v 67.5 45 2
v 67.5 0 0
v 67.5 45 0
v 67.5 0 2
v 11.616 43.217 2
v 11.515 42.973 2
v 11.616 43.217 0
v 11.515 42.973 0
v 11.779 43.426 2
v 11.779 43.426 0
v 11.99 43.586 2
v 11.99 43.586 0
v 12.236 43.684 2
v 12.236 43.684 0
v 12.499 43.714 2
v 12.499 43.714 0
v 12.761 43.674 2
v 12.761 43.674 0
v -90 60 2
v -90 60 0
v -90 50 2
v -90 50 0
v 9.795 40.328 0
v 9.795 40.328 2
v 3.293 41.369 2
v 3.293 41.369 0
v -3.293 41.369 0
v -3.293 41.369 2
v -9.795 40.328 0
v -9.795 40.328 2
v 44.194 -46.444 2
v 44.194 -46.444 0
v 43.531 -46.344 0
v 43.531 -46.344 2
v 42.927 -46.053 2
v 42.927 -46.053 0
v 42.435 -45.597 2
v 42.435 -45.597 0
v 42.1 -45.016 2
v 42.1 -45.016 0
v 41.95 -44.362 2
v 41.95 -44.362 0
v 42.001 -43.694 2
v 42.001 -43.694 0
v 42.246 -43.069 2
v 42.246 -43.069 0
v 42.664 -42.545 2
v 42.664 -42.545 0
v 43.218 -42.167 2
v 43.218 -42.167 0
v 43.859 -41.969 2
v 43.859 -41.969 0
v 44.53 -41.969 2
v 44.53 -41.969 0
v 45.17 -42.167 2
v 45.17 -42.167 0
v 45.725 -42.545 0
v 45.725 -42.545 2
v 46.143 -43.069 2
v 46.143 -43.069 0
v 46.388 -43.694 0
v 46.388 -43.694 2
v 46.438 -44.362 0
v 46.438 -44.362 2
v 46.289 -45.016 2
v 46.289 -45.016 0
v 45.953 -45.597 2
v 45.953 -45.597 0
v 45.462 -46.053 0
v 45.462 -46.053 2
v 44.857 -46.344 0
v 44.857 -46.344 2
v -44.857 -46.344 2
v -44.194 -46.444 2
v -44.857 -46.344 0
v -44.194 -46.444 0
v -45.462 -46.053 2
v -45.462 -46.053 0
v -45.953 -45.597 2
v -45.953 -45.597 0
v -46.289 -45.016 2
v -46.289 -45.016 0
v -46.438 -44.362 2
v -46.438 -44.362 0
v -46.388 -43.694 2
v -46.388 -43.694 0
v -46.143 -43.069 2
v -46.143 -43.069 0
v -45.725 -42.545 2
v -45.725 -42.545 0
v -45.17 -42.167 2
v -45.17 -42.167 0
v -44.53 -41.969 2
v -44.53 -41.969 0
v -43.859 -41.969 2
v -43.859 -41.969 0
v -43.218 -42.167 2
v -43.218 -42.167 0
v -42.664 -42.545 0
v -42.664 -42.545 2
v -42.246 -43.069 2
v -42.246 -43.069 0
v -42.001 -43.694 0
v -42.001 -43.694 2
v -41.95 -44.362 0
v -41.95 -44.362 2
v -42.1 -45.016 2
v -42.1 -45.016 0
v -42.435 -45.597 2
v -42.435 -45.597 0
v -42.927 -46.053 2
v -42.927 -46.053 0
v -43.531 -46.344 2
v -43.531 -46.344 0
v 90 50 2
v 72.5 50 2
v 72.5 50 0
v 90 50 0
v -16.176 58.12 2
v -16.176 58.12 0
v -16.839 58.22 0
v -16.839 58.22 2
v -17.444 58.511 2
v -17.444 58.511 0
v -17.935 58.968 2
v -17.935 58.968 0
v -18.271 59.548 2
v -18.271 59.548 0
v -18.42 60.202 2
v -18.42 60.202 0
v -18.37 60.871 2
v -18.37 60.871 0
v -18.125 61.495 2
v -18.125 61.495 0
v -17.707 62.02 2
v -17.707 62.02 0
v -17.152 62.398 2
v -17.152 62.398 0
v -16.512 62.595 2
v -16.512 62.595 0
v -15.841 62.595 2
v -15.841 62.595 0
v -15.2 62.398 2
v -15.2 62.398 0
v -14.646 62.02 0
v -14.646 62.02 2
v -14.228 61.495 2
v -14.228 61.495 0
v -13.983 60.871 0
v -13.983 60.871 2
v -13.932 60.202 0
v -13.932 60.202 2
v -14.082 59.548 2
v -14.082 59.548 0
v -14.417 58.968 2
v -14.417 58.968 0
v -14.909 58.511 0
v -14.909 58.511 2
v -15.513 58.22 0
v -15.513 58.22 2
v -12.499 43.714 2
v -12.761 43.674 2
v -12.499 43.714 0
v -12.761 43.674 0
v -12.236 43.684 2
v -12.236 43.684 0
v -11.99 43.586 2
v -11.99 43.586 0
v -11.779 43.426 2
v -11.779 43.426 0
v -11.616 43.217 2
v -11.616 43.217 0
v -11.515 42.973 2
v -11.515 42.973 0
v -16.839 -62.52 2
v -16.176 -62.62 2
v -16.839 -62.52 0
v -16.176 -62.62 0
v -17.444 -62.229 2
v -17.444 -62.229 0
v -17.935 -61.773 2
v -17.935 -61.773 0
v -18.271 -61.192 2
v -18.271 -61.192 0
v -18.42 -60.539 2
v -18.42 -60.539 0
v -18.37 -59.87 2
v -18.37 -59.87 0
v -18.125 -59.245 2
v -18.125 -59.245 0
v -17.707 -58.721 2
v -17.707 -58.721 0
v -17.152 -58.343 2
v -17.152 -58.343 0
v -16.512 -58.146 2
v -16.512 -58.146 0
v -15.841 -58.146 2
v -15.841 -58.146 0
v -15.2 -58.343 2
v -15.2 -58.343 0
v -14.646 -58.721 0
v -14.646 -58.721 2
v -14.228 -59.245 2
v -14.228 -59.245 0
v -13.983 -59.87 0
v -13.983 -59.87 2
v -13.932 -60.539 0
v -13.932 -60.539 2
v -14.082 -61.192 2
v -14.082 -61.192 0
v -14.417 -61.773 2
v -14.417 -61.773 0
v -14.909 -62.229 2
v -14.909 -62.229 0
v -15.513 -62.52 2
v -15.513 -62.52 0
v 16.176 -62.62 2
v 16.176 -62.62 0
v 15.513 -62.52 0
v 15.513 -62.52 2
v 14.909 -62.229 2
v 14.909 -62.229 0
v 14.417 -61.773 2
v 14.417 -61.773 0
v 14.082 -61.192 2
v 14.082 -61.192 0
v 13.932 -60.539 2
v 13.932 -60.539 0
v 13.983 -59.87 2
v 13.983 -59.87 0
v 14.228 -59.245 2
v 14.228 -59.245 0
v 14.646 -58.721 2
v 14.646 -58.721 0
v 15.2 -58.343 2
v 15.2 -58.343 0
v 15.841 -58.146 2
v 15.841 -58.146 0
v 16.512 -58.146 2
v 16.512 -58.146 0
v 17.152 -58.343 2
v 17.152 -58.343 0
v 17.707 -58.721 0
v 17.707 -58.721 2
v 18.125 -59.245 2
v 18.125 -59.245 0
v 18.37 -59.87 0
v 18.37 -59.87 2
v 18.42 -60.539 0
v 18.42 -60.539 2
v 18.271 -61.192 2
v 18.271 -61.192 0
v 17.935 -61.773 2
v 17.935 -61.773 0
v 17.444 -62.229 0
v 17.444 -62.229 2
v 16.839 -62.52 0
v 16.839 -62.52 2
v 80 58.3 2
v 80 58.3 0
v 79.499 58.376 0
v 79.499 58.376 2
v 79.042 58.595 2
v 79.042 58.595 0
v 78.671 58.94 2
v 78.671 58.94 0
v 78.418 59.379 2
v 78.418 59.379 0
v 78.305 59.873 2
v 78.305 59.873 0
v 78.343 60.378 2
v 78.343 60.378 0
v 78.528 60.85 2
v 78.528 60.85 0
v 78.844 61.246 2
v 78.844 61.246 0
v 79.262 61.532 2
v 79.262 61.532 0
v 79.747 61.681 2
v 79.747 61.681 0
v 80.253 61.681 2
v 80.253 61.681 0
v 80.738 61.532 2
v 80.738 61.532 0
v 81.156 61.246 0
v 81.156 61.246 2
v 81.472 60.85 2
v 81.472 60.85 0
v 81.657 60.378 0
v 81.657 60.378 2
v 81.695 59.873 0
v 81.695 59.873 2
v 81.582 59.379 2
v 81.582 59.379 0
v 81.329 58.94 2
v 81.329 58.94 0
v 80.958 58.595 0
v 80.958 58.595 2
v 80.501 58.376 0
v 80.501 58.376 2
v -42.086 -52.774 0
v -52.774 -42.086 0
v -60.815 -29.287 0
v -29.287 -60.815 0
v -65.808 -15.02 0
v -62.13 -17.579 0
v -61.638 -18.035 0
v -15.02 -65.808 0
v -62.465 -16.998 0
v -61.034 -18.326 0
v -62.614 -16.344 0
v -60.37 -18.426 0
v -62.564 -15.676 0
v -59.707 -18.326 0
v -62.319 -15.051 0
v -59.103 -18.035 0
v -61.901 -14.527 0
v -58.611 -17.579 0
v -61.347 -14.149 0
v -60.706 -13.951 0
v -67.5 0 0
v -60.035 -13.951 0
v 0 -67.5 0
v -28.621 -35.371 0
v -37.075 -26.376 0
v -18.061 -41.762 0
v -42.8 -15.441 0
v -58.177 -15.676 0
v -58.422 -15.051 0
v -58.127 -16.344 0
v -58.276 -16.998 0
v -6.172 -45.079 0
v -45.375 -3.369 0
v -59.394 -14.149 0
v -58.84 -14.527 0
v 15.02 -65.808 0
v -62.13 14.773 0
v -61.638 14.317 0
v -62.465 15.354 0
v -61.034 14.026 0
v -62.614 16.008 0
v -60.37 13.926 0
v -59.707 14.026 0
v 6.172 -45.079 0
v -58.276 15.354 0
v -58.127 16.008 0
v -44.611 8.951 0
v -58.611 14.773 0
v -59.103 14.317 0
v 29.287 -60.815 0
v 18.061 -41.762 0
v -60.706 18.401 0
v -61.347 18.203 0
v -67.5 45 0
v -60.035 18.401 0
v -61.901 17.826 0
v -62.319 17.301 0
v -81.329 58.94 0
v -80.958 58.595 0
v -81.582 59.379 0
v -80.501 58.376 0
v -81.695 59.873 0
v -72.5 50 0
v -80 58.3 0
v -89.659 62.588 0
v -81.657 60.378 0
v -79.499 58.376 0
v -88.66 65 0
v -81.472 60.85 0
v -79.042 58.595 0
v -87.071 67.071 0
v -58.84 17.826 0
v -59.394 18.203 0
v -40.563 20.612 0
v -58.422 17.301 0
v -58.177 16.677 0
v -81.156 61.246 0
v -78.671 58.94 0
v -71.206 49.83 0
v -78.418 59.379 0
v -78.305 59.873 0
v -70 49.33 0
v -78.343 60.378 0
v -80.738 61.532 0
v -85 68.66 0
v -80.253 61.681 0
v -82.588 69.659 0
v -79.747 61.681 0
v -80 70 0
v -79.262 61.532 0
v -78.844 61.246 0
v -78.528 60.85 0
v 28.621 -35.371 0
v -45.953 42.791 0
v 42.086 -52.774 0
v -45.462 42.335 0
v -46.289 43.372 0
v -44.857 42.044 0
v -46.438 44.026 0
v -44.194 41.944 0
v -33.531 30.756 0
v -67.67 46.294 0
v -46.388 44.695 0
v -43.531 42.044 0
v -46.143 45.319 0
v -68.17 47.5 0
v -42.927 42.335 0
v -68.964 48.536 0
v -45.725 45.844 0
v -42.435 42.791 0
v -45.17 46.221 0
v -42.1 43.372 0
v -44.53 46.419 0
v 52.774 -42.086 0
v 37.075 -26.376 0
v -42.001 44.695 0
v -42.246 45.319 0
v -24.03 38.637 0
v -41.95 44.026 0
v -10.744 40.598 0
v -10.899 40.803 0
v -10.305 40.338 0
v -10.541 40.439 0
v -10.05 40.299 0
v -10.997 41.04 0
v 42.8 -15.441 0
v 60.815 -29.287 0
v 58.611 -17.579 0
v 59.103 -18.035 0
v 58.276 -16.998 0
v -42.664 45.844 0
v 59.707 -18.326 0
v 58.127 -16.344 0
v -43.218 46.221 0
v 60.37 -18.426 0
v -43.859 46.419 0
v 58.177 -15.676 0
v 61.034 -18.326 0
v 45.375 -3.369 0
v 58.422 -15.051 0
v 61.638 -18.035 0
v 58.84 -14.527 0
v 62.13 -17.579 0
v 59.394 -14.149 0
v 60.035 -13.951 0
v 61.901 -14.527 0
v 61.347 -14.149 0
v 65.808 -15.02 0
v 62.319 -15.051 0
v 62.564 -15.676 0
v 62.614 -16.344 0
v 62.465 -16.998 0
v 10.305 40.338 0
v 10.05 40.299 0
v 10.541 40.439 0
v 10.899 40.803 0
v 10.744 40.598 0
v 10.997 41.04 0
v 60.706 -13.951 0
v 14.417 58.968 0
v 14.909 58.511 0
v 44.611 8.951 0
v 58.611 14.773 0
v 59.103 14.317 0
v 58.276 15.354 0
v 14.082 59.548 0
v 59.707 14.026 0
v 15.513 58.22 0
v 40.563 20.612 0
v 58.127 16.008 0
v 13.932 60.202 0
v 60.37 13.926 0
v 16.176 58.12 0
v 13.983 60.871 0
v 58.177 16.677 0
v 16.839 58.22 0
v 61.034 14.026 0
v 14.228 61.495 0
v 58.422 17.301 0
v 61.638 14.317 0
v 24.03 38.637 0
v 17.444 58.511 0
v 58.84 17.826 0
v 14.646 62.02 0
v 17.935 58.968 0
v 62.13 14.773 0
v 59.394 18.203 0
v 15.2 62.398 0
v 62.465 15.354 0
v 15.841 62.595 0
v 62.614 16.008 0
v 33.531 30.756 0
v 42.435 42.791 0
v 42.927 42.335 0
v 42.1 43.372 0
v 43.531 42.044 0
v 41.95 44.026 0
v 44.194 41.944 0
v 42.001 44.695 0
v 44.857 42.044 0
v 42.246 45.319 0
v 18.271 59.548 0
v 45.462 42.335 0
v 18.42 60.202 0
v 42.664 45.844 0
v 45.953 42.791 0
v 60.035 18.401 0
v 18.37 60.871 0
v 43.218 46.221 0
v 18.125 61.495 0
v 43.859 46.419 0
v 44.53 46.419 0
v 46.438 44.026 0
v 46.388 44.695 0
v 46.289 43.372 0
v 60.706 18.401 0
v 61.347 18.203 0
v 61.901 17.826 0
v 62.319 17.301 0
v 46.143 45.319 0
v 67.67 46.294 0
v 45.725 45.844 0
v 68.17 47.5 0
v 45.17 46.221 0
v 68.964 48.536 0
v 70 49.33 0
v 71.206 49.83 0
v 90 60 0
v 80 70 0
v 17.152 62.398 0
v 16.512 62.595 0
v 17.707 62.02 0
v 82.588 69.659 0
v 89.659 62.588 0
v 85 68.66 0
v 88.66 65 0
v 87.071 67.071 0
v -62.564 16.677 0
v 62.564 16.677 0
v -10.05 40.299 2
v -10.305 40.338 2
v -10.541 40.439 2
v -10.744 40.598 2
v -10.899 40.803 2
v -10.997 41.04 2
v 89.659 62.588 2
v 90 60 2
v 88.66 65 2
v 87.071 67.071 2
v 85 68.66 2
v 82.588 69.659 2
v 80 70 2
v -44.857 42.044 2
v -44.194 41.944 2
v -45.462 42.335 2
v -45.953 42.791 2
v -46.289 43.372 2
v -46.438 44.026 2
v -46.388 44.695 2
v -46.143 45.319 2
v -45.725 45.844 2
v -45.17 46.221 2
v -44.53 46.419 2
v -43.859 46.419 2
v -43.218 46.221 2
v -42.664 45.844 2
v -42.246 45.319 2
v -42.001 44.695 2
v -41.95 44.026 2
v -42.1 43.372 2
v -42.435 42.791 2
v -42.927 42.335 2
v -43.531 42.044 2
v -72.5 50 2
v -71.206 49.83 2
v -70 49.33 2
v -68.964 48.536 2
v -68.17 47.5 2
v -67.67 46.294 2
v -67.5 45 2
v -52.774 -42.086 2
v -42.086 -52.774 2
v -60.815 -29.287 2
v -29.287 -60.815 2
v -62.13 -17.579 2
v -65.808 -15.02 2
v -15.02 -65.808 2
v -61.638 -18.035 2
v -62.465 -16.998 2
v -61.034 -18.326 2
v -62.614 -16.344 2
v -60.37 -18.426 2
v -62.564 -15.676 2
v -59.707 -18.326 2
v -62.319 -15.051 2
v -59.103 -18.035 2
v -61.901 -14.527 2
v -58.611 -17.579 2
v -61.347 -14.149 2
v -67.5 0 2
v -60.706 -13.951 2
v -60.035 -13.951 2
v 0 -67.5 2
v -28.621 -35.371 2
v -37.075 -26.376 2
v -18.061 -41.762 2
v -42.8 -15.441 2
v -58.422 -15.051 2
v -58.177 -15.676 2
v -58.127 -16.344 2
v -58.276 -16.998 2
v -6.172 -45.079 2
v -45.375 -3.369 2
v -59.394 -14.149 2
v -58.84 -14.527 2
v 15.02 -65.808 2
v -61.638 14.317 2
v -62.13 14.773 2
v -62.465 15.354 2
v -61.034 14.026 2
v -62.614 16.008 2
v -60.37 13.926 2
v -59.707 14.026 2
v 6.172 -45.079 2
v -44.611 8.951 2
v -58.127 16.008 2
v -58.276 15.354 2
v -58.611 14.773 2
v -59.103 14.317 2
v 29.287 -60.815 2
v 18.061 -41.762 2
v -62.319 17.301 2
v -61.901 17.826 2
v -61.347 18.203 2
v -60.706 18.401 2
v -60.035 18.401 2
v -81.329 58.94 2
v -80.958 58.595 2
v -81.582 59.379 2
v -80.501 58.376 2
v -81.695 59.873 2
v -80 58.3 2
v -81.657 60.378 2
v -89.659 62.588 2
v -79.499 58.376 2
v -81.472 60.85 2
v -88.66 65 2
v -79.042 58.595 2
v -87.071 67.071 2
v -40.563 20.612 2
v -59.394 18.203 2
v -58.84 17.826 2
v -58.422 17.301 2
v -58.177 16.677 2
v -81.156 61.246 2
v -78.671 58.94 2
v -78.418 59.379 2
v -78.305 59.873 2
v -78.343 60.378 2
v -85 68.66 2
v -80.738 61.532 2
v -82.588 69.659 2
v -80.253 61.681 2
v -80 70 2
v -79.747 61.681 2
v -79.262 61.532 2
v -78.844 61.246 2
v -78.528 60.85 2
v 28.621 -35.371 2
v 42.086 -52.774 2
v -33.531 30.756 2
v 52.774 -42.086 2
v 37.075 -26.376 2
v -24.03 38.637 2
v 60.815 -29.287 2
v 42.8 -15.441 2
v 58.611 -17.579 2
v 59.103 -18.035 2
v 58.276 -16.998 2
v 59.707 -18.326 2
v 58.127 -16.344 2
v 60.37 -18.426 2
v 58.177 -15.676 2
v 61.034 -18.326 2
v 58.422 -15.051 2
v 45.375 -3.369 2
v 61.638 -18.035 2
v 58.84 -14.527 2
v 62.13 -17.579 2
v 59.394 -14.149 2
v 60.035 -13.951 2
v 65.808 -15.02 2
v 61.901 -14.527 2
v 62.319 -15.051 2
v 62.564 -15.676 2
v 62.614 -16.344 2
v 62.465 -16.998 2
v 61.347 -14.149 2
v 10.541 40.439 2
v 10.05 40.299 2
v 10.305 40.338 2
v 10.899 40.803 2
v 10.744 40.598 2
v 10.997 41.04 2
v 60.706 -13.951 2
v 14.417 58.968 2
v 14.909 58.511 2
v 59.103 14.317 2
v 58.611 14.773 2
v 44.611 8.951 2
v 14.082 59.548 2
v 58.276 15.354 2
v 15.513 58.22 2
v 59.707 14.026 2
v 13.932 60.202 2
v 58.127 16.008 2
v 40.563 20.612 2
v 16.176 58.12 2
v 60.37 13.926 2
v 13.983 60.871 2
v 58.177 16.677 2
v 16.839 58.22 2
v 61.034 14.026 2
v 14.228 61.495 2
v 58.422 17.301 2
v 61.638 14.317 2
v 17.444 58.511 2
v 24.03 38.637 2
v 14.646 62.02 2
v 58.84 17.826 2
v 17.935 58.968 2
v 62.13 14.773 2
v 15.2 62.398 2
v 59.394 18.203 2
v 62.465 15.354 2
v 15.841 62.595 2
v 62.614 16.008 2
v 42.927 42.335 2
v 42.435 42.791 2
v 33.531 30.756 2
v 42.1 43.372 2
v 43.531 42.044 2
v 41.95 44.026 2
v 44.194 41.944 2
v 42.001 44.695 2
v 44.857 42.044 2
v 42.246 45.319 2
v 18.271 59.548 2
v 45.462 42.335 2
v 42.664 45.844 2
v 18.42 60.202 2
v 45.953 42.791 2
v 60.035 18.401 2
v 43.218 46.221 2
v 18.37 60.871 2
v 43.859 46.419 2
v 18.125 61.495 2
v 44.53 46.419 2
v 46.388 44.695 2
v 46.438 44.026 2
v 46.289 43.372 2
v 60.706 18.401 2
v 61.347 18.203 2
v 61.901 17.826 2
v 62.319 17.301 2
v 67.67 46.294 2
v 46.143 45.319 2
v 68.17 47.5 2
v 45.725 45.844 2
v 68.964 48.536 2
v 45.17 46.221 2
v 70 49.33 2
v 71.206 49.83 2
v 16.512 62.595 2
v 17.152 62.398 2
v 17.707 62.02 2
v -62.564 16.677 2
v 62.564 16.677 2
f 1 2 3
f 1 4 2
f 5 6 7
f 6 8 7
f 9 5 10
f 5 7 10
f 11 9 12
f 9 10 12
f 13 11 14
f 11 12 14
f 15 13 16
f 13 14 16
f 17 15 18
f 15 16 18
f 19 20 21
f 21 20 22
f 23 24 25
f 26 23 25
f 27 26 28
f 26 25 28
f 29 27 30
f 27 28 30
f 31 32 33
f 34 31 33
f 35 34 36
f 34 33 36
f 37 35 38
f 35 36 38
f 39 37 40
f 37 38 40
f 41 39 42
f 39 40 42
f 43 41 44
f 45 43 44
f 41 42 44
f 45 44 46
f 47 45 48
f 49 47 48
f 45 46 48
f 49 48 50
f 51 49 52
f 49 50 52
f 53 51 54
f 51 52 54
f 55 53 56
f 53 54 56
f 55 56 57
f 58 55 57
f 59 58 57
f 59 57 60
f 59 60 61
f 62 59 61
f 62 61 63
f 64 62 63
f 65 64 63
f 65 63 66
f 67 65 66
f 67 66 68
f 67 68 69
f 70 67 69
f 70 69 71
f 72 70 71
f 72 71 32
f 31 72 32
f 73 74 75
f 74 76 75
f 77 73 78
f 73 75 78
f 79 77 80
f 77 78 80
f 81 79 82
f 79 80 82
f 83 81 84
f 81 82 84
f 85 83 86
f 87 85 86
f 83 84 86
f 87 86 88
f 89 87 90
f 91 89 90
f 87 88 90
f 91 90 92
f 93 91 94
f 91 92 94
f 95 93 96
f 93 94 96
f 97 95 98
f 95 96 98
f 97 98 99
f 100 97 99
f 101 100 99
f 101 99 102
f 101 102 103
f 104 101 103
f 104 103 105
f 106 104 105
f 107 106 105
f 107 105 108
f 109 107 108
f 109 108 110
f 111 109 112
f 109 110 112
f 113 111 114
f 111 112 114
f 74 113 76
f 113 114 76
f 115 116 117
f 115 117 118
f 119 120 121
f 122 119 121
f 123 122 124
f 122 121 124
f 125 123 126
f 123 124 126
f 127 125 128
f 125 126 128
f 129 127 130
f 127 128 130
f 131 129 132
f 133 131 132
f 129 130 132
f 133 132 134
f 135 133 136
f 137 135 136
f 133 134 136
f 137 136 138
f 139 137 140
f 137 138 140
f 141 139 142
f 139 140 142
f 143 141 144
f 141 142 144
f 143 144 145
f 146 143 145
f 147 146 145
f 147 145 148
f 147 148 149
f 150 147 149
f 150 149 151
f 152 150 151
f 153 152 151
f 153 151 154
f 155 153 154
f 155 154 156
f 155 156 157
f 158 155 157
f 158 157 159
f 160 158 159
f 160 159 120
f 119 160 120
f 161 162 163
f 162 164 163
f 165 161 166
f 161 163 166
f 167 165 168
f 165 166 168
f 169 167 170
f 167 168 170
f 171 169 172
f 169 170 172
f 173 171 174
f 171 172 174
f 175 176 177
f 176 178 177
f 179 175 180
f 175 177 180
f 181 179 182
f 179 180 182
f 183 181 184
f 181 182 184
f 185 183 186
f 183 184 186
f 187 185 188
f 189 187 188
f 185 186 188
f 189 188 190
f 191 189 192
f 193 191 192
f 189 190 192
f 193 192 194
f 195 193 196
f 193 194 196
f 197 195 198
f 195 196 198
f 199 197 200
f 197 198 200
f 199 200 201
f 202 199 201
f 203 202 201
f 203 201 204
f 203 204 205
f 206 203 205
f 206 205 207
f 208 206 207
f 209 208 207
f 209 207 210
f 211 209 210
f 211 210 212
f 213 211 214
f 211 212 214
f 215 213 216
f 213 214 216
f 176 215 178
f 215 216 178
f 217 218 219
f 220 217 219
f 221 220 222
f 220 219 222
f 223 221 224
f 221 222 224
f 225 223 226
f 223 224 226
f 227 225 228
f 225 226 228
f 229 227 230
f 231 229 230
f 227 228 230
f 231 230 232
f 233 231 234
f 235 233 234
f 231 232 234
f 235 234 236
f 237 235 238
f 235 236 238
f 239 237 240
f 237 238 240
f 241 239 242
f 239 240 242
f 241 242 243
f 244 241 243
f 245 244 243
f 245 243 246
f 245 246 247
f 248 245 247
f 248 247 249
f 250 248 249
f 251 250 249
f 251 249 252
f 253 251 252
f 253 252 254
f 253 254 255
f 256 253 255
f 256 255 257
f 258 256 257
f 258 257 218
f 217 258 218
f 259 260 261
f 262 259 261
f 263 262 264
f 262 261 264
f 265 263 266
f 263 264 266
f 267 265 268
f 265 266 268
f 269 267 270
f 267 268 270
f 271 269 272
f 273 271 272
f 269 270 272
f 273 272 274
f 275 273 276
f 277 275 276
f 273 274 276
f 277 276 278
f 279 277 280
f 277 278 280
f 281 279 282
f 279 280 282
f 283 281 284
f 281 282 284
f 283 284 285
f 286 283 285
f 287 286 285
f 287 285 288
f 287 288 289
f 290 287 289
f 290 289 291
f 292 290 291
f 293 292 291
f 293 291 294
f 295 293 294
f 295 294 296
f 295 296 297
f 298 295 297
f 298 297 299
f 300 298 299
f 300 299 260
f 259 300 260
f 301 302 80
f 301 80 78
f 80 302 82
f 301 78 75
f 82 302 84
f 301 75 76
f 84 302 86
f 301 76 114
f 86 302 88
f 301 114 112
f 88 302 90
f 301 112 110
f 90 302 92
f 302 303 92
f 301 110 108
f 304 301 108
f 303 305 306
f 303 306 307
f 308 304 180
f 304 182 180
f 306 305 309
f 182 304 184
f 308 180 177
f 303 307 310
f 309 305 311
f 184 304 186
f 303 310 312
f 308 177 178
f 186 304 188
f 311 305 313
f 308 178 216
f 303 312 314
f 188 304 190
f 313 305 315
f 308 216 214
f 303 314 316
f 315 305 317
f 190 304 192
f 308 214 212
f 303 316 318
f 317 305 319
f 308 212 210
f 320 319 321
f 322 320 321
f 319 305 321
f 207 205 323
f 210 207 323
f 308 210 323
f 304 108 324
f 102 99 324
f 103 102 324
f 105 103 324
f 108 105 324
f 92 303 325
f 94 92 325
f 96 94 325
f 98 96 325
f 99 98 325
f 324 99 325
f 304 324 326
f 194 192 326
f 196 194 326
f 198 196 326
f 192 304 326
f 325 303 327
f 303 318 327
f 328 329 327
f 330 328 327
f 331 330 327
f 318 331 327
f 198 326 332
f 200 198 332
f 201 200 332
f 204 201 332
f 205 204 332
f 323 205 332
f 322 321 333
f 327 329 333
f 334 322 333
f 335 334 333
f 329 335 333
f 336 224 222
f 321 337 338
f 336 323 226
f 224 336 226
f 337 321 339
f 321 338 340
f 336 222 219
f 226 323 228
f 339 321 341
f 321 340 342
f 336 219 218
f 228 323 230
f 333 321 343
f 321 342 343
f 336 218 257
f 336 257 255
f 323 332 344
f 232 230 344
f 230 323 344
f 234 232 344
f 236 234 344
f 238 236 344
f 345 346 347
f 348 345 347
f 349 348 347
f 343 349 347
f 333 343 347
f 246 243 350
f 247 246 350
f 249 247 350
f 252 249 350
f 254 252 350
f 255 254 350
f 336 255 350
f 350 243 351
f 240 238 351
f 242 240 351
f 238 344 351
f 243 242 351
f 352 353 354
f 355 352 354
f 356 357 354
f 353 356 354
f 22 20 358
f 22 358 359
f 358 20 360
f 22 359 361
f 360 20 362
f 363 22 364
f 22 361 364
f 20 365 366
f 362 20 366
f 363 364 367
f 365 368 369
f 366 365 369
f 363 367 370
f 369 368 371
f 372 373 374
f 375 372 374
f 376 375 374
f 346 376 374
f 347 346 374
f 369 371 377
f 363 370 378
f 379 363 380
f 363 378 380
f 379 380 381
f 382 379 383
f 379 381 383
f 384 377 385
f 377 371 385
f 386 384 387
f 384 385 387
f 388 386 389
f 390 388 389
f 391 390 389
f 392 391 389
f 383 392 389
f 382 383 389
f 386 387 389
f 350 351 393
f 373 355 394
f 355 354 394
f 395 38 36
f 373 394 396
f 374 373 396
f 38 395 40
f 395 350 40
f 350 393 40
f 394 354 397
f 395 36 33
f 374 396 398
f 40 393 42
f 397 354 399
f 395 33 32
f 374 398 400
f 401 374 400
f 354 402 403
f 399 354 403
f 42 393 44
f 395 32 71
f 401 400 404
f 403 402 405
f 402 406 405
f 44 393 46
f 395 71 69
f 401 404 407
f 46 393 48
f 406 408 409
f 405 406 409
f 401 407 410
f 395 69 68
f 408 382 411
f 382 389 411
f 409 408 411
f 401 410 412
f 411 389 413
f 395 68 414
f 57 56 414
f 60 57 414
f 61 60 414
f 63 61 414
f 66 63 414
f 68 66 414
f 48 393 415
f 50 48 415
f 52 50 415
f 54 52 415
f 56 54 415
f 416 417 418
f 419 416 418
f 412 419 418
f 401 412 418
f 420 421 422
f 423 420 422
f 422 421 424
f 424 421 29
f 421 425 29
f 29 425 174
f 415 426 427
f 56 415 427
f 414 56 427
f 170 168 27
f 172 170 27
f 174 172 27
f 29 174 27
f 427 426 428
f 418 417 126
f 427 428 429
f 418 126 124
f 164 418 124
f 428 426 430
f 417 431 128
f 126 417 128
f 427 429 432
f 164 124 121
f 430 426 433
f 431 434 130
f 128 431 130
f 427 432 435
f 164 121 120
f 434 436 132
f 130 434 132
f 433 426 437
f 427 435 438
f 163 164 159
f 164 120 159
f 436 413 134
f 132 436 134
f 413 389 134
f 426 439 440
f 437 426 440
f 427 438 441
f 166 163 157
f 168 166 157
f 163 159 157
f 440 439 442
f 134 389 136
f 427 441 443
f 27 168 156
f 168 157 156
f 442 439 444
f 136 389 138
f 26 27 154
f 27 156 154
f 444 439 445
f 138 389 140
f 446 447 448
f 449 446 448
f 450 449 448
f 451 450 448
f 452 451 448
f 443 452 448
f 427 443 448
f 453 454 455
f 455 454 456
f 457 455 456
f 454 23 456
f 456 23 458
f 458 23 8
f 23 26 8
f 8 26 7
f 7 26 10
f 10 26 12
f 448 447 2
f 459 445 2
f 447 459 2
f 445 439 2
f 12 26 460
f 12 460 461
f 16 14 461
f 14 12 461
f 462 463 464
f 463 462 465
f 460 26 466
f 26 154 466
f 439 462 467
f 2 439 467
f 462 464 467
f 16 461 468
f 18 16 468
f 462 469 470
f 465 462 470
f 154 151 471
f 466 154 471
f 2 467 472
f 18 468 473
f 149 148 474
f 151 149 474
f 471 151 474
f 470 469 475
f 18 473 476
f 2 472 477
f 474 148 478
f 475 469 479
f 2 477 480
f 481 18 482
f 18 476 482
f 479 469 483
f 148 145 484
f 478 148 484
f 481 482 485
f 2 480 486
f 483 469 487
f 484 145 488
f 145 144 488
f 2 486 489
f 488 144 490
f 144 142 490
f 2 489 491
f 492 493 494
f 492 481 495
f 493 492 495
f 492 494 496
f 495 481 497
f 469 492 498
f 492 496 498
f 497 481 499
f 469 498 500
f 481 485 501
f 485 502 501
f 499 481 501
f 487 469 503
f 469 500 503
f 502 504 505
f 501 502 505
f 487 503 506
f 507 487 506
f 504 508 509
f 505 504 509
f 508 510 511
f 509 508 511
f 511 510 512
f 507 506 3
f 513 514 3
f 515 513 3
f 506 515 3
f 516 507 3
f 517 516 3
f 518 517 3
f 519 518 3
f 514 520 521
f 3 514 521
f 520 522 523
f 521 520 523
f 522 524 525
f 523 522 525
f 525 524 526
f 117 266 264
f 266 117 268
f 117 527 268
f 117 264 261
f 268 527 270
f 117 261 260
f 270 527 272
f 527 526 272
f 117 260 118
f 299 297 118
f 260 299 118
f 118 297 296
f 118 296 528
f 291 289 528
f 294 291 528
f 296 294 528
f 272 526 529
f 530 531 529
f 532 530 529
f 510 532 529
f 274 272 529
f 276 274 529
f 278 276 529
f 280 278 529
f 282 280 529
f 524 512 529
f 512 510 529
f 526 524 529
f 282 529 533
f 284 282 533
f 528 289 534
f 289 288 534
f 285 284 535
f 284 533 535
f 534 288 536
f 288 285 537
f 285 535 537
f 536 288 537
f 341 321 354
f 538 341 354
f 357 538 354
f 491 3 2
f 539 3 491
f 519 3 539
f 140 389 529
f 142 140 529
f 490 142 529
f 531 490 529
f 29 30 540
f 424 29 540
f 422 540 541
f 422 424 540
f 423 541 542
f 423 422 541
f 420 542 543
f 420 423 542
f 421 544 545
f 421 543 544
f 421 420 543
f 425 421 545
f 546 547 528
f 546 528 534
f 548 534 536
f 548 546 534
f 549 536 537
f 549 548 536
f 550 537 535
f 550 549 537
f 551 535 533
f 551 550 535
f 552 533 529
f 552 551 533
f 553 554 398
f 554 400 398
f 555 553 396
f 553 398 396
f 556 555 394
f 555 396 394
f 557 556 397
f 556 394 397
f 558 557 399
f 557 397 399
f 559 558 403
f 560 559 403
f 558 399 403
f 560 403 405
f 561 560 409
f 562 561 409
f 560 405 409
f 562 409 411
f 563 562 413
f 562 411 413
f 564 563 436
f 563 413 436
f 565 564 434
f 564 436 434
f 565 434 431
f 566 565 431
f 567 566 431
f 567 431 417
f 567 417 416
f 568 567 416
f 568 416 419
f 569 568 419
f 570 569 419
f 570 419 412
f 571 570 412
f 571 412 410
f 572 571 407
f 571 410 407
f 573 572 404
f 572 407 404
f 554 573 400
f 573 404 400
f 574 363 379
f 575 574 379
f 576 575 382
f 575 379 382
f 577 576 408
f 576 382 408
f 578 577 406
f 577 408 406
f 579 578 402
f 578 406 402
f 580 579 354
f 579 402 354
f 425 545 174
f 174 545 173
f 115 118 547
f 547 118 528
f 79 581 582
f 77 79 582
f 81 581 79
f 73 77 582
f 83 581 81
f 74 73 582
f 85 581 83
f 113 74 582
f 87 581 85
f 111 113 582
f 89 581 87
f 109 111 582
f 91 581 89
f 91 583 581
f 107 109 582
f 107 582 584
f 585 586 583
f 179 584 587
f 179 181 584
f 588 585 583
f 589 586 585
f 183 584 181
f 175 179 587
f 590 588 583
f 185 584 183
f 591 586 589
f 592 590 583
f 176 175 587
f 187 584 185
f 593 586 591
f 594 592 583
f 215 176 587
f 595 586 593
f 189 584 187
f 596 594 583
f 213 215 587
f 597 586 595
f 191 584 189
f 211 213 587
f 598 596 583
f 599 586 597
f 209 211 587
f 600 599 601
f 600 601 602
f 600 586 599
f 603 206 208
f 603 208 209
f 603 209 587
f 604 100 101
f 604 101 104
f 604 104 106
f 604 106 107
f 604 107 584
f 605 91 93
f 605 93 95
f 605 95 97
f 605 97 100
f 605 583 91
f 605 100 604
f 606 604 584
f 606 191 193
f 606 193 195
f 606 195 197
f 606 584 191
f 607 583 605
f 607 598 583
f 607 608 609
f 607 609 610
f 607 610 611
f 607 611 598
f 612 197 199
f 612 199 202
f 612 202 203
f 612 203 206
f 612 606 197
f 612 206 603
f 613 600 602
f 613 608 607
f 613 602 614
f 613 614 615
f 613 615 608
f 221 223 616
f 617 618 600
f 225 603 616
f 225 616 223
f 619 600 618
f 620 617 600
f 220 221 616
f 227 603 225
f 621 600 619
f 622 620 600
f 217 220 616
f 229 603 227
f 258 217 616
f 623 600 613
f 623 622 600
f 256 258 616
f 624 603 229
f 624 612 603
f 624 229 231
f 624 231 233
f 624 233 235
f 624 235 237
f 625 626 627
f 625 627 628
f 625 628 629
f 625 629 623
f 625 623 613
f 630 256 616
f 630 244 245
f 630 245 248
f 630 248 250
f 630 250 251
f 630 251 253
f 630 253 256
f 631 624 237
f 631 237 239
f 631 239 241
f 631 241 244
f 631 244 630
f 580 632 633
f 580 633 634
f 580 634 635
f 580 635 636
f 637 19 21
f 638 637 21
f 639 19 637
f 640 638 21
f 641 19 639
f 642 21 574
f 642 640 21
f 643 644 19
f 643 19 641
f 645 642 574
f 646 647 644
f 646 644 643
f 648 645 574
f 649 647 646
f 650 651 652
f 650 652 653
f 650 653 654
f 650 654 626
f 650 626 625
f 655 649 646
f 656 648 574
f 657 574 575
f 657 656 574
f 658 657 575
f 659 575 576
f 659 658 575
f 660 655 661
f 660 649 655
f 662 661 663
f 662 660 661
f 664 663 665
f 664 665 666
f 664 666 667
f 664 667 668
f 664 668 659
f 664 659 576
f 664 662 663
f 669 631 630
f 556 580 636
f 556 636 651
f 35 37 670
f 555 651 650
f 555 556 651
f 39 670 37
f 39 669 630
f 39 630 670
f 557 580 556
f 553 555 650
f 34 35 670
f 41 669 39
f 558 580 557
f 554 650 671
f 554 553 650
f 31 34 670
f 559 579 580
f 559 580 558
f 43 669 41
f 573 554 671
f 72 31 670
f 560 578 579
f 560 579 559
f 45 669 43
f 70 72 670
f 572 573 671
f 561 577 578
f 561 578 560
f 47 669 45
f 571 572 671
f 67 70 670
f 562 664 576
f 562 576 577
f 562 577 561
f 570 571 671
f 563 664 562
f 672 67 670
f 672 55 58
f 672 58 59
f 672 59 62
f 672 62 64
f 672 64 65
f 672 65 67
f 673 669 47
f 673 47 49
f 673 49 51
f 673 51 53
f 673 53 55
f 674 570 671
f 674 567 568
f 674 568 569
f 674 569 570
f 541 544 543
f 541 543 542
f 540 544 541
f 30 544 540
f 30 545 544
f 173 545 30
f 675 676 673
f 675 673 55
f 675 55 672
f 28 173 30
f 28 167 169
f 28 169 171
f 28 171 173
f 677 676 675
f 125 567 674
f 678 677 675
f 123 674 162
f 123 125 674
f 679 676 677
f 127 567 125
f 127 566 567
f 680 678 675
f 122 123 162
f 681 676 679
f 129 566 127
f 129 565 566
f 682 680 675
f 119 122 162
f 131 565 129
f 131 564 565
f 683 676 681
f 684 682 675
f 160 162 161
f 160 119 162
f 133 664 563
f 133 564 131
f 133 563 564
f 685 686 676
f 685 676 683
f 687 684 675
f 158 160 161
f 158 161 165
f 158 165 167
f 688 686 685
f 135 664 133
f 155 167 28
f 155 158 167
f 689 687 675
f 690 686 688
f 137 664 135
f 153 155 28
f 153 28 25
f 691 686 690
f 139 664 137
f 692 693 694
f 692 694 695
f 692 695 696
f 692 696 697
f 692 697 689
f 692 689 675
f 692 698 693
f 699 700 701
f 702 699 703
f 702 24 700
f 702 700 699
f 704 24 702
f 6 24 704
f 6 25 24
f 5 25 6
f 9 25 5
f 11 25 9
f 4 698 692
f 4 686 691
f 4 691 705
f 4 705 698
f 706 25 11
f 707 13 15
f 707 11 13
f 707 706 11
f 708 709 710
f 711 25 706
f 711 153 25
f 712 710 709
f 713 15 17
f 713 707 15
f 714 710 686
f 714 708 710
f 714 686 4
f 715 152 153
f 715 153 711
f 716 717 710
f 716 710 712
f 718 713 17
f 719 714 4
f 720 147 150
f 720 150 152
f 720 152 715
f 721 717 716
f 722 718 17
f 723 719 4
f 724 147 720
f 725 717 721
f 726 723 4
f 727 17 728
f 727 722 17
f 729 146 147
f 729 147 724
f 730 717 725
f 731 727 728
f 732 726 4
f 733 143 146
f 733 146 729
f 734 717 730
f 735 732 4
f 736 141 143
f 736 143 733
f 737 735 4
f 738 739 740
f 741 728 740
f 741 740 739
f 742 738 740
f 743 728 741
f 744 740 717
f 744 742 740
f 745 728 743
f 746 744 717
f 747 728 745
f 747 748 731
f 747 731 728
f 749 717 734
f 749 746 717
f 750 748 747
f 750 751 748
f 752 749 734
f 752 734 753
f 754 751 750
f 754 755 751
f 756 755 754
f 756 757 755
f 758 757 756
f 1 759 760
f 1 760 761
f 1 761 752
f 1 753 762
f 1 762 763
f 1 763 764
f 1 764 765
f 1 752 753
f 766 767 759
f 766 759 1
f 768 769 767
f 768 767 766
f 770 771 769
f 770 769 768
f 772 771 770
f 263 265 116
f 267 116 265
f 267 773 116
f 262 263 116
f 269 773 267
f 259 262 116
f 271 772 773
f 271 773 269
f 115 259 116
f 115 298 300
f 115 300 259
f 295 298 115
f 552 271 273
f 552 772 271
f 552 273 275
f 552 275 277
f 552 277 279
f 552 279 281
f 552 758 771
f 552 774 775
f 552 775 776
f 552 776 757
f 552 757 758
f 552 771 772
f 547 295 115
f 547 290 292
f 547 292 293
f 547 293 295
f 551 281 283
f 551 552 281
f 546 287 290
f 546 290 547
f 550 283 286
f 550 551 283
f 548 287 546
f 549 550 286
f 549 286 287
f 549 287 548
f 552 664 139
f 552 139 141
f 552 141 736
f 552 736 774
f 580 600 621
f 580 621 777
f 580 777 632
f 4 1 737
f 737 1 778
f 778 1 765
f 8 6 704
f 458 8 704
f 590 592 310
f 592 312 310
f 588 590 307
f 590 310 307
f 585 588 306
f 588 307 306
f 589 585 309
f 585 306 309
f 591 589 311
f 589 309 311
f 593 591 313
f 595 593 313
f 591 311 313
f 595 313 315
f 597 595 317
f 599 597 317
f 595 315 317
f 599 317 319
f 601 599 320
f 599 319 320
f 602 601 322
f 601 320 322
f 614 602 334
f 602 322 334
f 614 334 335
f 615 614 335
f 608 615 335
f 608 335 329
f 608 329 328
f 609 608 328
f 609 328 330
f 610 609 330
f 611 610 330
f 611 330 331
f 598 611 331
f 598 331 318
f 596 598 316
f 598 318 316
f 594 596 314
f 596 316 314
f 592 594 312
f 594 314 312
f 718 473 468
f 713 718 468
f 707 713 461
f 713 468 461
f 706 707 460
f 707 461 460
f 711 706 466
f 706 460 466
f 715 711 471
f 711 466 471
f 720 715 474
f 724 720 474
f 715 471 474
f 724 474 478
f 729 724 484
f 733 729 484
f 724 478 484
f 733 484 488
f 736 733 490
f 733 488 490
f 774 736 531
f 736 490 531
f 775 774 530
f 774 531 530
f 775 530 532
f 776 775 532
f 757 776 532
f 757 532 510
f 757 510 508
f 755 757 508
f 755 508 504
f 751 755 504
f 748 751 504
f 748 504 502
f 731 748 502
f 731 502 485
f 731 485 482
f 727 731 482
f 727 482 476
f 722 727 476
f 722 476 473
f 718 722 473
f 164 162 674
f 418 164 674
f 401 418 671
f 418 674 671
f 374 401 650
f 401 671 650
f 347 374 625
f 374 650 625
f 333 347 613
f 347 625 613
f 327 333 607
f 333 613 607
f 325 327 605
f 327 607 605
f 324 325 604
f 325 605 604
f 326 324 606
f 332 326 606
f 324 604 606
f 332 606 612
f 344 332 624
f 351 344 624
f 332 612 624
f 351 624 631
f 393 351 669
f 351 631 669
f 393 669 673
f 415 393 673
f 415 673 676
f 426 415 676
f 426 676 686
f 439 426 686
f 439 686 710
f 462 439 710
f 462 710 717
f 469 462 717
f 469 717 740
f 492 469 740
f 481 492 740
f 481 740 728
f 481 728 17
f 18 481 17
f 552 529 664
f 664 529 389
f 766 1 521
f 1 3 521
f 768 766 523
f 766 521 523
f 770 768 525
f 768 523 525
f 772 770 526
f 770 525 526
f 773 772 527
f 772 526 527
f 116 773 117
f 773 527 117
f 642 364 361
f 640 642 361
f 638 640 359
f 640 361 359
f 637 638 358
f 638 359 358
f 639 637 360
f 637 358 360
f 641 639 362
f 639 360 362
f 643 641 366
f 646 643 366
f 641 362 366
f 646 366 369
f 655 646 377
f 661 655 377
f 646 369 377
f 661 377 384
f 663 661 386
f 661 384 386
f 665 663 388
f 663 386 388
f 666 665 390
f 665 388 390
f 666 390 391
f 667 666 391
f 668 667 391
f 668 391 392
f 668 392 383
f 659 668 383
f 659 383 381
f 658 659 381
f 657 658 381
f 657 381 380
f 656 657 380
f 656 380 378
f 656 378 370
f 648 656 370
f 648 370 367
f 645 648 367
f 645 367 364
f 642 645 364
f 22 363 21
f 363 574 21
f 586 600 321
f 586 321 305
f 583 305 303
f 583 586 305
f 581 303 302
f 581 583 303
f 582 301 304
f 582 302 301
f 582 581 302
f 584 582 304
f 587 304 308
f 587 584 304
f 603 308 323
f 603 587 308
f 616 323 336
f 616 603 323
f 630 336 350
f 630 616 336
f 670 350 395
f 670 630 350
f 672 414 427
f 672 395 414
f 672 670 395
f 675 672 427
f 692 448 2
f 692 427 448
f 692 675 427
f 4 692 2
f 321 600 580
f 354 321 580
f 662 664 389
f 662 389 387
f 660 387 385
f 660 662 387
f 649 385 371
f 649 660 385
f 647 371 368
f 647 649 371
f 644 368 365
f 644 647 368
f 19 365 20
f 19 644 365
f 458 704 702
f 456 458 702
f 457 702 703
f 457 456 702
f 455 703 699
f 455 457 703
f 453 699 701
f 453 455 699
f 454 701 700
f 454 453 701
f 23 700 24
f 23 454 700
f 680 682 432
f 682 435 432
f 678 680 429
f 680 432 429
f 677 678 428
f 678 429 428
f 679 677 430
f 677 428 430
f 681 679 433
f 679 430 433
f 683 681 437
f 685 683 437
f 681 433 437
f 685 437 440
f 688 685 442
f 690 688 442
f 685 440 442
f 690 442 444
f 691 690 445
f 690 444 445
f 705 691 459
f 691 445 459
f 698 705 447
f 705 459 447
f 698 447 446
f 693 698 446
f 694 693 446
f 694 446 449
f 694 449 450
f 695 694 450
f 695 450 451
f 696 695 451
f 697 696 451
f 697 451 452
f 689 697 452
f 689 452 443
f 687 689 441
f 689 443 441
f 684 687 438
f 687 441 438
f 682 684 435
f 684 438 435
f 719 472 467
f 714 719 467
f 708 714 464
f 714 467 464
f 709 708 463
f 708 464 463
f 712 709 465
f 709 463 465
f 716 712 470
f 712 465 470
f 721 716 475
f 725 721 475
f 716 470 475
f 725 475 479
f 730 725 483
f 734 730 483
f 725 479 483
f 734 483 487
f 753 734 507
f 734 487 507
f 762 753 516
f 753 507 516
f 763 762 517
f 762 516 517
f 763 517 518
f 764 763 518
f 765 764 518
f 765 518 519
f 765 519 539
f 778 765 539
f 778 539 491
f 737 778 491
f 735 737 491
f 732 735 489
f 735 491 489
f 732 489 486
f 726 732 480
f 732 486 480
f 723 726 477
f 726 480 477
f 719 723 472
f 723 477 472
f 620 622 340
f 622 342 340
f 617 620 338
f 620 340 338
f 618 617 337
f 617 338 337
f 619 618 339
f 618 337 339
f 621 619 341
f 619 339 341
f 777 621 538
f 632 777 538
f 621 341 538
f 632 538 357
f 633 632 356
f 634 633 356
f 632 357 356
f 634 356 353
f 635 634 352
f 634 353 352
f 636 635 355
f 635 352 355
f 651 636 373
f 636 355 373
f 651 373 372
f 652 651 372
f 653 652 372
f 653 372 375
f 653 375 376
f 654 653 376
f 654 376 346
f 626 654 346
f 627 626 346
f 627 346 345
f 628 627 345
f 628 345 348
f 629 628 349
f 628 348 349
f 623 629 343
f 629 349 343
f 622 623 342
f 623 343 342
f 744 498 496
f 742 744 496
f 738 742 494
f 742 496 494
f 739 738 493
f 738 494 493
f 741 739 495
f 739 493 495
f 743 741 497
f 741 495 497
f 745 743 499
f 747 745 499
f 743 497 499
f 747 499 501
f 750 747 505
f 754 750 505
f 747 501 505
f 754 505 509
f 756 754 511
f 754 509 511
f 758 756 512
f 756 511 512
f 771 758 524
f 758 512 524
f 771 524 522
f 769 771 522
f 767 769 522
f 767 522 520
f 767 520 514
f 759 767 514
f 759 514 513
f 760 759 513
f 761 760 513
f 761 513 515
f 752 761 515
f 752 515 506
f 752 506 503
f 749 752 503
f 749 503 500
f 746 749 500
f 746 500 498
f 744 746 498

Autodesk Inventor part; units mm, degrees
ref_plane "YZ Plane" through (0, 0, 0) normal (1, 0, 0) x (0, 1, 0)
ref_plane "XZ Plane" through (0, 0, 0) normal (0, 1, 0) x (-1, 0, 0)
ref_plane "XY Plane" through (0, 0, 0) normal (0, 0, 1) x (1, 0, 0)
sketch "スケッチ1" plane through (0, 0, 0) normal (0, 0, 1) x (1, 0, 0)
  line L0 (-90, -67.5) -> (90, -67.5)
  line L1 (90, -67.5) -> (90, 70)
  line L2 (90, 70) -> (-90, 70)
  line L3 (-90, 70) -> (-90, -67.5)
  point P0 (0, 0)
  point P1 (-29.0861, -67.5)
  dimension "d37" = 90
  dimension "d38" = 70
  dimension "d40" = 90
  dimension "d41" = 67.5
extrude "プレート1" add sketch "スケッチ1" along normal blind 2
sketch "スケッチ2" plane through (0, 0, 2) normal (0, 0, 1) x (1, 0, 0)
  circle A0 centre (0, 0) radius 45.5
  dimension "d5" = 91
extrude "押し出し1" cut sketch "スケッチ2" against normal blind 10
sketch "スケッチ3" plane through (0, 0, 2) normal (0, 0, 1) x (1, 0, 0)
  circle A0 centre (0, 0) radius 62.5
  point P0 (-16.1762, 60.3704)
  point P1 (-44.1942, 44.1942)
  point P2 (-60.3704, 16.1762)
  point P3 (-60.3704, -16.1762)
  point P4 (-44.1942, -44.1942)
  point P5 (-16.1762, -60.3704)
  point P6 (16.1762, -60.3704)
  point P7 (44.1942, -44.1942)
  point P8 (60.3704, -16.1762)
  point P9 (60.3704, 16.1762)
  point P10 (44.1942, 44.1942)
  point P11 (16.1762, 60.3704)
  dimension "d8" = 125
  dimension "d11" = 360
  dimension "d20" = 0
hole "穴1" at (-16.1762, 60.3704, 2) at (-44.1942, 44.1942, 2) at (-60.3704, 16.1762, 2) at (-60.3704, -16.1762, 2) at (-44.1942, -44.1942, 2) at (-16.1762, -60.3704, 2) at (16.1762, -60.3704, 2) at (44.1942, -44.1942, 2) at (60.3704, -16.1762, 2) at (60.3704, 16.1762, 2) at (44.1942, 44.1942, 2) at (16.1762, 60.3704, 2) direction (0, 0, -1) diameter 4.5 end through all clearance for "Flat Head Machine Screw" size "M4" standard "Ansi Metric M Profile"
fillet "コーナーR2" radius 10 2 edges at (-90, 70, 1) (90, 70, 1)
sketch "スケッチ5" plane through (0, 0, 2) normal (0, 0, 1) x (1, 0, 0)
  arc A0 (-80, 70) -> (-90, 60) centre (-80, 60) ccw projected
  arc A1 (90, 60) -> (80, 70) centre (80, 60) ccw projected
  point P0 (0, 0)
hole "穴2" at (-80, 60, 2) at (80, 60, 2) direction (0, 0, -1) diameter 3.4 end through all clearance for "Socket Head Cap Screw" size "M3" standard "Ansi Metric M Profile"
sketch "スケッチ7" plane through (0, 0, 2) normal (0, 0, 1) x (1, 0, 0)
  circle A0 centre (0, 0) radius 45.5 projected
  circle A1 centre (0, 0) radius 67.5
  line L0 (90, -67.5) -> (-90, -67.5) projected
  line L1 (-90, -67.5) -> (-90, 60) projected
  line L2 (-90, -67.5) -> (-67.5, -67.5)
  line L3 (-67.5, -67.5) -> (-67.5, 50)
  line L4 (-67.5, 50) -> (-90, 50)
  line L5 (-90, 50) -> (-90, -67.5)
  line L6 (90, -67.5) -> (67.5, -67.5)
  line L7 (67.5, -67.5) -> (67.5, 50)
  line L8 (67.5, 50) -> (90, 50)
  line L9 (90, 50) -> (90, -67.5)
  line L10 (-80, 70) -> (80, 70) projected
  point P0 (67.5, 0)
  point P1 (0, -67.5)
  point P2 (-67.5, 0)
  dimension "d56" = 20
  dimension "d57" = 20
extrude "押し出し4" cut sketch "スケッチ7" against normal blind 10 contours L7 L0 A1 | L7 L8 L9 L0 | A1 L0 L3 | L3 L0 L1 L4
fillet "コーナーR4" radius 5 2 edges at (-67.5, 50, 1) (67.5, 50, 1)
sketch "スケッチ9" plane through (0, 0, 2) normal (0, 0, 1) x (1, 0, 0)
  circle A0 centre (0, 0) radius 45.5 projected
  circle A1 centre (0, 0) radius 41.5
  line L0 (0, 0) -> (-11.7763, 43.9496)
  line L1 (11.7763, 43.9496) -> (0, 0)
  line L2 (0, 97.5) -> (0, -95) projected
  point P0 (-10.741, 40.0859)
  point P1 (10.741, 40.0859)
  dimension "d76" = 4
  dimension "d77" = 15
  dimension "d78" = 15
extrude "押し出し5" add sketch "スケッチ9" against normal up to surface (2 mm away) contours L1 A1 L2 A0 | L2 A1 L0 A0 picked at (5.1612, 43.8259) picked at (-6.3577, 43.6684)
fillet "コーナーR5" radius 1 4 edges at (10.741, 40.0859, 1) (-10.741, 40.0859, 1) (-11.7763, 43.9496, 1) (11.7763, 43.9496, 1)
equation "\"d40\" = d37"
equation "\"d18\" = Thickness"
equation "\"d47\" = Thickness"
equation "\"d2\" = Thickness"
equation "\"BendRadius\" = Thickness"
equation "\"BendReliefWidth\" = Thickness"
equation "\"BendReliefDepth\" = 0.5 * Thickness"
equation "\"CornerReliefSize\" = 4 * Thickness"
equation "\"MinimumRemnant\" = 2 * Thickness"
equation "\"TransitionRadius\" = BendRadius"
equation "\"JacobiRadiusSize\" = BendRadius"
equation "\"GapSize\" = Thickness"
equation "\"Thickness\" = 2"
properties part number "base4" material "CFRP"
